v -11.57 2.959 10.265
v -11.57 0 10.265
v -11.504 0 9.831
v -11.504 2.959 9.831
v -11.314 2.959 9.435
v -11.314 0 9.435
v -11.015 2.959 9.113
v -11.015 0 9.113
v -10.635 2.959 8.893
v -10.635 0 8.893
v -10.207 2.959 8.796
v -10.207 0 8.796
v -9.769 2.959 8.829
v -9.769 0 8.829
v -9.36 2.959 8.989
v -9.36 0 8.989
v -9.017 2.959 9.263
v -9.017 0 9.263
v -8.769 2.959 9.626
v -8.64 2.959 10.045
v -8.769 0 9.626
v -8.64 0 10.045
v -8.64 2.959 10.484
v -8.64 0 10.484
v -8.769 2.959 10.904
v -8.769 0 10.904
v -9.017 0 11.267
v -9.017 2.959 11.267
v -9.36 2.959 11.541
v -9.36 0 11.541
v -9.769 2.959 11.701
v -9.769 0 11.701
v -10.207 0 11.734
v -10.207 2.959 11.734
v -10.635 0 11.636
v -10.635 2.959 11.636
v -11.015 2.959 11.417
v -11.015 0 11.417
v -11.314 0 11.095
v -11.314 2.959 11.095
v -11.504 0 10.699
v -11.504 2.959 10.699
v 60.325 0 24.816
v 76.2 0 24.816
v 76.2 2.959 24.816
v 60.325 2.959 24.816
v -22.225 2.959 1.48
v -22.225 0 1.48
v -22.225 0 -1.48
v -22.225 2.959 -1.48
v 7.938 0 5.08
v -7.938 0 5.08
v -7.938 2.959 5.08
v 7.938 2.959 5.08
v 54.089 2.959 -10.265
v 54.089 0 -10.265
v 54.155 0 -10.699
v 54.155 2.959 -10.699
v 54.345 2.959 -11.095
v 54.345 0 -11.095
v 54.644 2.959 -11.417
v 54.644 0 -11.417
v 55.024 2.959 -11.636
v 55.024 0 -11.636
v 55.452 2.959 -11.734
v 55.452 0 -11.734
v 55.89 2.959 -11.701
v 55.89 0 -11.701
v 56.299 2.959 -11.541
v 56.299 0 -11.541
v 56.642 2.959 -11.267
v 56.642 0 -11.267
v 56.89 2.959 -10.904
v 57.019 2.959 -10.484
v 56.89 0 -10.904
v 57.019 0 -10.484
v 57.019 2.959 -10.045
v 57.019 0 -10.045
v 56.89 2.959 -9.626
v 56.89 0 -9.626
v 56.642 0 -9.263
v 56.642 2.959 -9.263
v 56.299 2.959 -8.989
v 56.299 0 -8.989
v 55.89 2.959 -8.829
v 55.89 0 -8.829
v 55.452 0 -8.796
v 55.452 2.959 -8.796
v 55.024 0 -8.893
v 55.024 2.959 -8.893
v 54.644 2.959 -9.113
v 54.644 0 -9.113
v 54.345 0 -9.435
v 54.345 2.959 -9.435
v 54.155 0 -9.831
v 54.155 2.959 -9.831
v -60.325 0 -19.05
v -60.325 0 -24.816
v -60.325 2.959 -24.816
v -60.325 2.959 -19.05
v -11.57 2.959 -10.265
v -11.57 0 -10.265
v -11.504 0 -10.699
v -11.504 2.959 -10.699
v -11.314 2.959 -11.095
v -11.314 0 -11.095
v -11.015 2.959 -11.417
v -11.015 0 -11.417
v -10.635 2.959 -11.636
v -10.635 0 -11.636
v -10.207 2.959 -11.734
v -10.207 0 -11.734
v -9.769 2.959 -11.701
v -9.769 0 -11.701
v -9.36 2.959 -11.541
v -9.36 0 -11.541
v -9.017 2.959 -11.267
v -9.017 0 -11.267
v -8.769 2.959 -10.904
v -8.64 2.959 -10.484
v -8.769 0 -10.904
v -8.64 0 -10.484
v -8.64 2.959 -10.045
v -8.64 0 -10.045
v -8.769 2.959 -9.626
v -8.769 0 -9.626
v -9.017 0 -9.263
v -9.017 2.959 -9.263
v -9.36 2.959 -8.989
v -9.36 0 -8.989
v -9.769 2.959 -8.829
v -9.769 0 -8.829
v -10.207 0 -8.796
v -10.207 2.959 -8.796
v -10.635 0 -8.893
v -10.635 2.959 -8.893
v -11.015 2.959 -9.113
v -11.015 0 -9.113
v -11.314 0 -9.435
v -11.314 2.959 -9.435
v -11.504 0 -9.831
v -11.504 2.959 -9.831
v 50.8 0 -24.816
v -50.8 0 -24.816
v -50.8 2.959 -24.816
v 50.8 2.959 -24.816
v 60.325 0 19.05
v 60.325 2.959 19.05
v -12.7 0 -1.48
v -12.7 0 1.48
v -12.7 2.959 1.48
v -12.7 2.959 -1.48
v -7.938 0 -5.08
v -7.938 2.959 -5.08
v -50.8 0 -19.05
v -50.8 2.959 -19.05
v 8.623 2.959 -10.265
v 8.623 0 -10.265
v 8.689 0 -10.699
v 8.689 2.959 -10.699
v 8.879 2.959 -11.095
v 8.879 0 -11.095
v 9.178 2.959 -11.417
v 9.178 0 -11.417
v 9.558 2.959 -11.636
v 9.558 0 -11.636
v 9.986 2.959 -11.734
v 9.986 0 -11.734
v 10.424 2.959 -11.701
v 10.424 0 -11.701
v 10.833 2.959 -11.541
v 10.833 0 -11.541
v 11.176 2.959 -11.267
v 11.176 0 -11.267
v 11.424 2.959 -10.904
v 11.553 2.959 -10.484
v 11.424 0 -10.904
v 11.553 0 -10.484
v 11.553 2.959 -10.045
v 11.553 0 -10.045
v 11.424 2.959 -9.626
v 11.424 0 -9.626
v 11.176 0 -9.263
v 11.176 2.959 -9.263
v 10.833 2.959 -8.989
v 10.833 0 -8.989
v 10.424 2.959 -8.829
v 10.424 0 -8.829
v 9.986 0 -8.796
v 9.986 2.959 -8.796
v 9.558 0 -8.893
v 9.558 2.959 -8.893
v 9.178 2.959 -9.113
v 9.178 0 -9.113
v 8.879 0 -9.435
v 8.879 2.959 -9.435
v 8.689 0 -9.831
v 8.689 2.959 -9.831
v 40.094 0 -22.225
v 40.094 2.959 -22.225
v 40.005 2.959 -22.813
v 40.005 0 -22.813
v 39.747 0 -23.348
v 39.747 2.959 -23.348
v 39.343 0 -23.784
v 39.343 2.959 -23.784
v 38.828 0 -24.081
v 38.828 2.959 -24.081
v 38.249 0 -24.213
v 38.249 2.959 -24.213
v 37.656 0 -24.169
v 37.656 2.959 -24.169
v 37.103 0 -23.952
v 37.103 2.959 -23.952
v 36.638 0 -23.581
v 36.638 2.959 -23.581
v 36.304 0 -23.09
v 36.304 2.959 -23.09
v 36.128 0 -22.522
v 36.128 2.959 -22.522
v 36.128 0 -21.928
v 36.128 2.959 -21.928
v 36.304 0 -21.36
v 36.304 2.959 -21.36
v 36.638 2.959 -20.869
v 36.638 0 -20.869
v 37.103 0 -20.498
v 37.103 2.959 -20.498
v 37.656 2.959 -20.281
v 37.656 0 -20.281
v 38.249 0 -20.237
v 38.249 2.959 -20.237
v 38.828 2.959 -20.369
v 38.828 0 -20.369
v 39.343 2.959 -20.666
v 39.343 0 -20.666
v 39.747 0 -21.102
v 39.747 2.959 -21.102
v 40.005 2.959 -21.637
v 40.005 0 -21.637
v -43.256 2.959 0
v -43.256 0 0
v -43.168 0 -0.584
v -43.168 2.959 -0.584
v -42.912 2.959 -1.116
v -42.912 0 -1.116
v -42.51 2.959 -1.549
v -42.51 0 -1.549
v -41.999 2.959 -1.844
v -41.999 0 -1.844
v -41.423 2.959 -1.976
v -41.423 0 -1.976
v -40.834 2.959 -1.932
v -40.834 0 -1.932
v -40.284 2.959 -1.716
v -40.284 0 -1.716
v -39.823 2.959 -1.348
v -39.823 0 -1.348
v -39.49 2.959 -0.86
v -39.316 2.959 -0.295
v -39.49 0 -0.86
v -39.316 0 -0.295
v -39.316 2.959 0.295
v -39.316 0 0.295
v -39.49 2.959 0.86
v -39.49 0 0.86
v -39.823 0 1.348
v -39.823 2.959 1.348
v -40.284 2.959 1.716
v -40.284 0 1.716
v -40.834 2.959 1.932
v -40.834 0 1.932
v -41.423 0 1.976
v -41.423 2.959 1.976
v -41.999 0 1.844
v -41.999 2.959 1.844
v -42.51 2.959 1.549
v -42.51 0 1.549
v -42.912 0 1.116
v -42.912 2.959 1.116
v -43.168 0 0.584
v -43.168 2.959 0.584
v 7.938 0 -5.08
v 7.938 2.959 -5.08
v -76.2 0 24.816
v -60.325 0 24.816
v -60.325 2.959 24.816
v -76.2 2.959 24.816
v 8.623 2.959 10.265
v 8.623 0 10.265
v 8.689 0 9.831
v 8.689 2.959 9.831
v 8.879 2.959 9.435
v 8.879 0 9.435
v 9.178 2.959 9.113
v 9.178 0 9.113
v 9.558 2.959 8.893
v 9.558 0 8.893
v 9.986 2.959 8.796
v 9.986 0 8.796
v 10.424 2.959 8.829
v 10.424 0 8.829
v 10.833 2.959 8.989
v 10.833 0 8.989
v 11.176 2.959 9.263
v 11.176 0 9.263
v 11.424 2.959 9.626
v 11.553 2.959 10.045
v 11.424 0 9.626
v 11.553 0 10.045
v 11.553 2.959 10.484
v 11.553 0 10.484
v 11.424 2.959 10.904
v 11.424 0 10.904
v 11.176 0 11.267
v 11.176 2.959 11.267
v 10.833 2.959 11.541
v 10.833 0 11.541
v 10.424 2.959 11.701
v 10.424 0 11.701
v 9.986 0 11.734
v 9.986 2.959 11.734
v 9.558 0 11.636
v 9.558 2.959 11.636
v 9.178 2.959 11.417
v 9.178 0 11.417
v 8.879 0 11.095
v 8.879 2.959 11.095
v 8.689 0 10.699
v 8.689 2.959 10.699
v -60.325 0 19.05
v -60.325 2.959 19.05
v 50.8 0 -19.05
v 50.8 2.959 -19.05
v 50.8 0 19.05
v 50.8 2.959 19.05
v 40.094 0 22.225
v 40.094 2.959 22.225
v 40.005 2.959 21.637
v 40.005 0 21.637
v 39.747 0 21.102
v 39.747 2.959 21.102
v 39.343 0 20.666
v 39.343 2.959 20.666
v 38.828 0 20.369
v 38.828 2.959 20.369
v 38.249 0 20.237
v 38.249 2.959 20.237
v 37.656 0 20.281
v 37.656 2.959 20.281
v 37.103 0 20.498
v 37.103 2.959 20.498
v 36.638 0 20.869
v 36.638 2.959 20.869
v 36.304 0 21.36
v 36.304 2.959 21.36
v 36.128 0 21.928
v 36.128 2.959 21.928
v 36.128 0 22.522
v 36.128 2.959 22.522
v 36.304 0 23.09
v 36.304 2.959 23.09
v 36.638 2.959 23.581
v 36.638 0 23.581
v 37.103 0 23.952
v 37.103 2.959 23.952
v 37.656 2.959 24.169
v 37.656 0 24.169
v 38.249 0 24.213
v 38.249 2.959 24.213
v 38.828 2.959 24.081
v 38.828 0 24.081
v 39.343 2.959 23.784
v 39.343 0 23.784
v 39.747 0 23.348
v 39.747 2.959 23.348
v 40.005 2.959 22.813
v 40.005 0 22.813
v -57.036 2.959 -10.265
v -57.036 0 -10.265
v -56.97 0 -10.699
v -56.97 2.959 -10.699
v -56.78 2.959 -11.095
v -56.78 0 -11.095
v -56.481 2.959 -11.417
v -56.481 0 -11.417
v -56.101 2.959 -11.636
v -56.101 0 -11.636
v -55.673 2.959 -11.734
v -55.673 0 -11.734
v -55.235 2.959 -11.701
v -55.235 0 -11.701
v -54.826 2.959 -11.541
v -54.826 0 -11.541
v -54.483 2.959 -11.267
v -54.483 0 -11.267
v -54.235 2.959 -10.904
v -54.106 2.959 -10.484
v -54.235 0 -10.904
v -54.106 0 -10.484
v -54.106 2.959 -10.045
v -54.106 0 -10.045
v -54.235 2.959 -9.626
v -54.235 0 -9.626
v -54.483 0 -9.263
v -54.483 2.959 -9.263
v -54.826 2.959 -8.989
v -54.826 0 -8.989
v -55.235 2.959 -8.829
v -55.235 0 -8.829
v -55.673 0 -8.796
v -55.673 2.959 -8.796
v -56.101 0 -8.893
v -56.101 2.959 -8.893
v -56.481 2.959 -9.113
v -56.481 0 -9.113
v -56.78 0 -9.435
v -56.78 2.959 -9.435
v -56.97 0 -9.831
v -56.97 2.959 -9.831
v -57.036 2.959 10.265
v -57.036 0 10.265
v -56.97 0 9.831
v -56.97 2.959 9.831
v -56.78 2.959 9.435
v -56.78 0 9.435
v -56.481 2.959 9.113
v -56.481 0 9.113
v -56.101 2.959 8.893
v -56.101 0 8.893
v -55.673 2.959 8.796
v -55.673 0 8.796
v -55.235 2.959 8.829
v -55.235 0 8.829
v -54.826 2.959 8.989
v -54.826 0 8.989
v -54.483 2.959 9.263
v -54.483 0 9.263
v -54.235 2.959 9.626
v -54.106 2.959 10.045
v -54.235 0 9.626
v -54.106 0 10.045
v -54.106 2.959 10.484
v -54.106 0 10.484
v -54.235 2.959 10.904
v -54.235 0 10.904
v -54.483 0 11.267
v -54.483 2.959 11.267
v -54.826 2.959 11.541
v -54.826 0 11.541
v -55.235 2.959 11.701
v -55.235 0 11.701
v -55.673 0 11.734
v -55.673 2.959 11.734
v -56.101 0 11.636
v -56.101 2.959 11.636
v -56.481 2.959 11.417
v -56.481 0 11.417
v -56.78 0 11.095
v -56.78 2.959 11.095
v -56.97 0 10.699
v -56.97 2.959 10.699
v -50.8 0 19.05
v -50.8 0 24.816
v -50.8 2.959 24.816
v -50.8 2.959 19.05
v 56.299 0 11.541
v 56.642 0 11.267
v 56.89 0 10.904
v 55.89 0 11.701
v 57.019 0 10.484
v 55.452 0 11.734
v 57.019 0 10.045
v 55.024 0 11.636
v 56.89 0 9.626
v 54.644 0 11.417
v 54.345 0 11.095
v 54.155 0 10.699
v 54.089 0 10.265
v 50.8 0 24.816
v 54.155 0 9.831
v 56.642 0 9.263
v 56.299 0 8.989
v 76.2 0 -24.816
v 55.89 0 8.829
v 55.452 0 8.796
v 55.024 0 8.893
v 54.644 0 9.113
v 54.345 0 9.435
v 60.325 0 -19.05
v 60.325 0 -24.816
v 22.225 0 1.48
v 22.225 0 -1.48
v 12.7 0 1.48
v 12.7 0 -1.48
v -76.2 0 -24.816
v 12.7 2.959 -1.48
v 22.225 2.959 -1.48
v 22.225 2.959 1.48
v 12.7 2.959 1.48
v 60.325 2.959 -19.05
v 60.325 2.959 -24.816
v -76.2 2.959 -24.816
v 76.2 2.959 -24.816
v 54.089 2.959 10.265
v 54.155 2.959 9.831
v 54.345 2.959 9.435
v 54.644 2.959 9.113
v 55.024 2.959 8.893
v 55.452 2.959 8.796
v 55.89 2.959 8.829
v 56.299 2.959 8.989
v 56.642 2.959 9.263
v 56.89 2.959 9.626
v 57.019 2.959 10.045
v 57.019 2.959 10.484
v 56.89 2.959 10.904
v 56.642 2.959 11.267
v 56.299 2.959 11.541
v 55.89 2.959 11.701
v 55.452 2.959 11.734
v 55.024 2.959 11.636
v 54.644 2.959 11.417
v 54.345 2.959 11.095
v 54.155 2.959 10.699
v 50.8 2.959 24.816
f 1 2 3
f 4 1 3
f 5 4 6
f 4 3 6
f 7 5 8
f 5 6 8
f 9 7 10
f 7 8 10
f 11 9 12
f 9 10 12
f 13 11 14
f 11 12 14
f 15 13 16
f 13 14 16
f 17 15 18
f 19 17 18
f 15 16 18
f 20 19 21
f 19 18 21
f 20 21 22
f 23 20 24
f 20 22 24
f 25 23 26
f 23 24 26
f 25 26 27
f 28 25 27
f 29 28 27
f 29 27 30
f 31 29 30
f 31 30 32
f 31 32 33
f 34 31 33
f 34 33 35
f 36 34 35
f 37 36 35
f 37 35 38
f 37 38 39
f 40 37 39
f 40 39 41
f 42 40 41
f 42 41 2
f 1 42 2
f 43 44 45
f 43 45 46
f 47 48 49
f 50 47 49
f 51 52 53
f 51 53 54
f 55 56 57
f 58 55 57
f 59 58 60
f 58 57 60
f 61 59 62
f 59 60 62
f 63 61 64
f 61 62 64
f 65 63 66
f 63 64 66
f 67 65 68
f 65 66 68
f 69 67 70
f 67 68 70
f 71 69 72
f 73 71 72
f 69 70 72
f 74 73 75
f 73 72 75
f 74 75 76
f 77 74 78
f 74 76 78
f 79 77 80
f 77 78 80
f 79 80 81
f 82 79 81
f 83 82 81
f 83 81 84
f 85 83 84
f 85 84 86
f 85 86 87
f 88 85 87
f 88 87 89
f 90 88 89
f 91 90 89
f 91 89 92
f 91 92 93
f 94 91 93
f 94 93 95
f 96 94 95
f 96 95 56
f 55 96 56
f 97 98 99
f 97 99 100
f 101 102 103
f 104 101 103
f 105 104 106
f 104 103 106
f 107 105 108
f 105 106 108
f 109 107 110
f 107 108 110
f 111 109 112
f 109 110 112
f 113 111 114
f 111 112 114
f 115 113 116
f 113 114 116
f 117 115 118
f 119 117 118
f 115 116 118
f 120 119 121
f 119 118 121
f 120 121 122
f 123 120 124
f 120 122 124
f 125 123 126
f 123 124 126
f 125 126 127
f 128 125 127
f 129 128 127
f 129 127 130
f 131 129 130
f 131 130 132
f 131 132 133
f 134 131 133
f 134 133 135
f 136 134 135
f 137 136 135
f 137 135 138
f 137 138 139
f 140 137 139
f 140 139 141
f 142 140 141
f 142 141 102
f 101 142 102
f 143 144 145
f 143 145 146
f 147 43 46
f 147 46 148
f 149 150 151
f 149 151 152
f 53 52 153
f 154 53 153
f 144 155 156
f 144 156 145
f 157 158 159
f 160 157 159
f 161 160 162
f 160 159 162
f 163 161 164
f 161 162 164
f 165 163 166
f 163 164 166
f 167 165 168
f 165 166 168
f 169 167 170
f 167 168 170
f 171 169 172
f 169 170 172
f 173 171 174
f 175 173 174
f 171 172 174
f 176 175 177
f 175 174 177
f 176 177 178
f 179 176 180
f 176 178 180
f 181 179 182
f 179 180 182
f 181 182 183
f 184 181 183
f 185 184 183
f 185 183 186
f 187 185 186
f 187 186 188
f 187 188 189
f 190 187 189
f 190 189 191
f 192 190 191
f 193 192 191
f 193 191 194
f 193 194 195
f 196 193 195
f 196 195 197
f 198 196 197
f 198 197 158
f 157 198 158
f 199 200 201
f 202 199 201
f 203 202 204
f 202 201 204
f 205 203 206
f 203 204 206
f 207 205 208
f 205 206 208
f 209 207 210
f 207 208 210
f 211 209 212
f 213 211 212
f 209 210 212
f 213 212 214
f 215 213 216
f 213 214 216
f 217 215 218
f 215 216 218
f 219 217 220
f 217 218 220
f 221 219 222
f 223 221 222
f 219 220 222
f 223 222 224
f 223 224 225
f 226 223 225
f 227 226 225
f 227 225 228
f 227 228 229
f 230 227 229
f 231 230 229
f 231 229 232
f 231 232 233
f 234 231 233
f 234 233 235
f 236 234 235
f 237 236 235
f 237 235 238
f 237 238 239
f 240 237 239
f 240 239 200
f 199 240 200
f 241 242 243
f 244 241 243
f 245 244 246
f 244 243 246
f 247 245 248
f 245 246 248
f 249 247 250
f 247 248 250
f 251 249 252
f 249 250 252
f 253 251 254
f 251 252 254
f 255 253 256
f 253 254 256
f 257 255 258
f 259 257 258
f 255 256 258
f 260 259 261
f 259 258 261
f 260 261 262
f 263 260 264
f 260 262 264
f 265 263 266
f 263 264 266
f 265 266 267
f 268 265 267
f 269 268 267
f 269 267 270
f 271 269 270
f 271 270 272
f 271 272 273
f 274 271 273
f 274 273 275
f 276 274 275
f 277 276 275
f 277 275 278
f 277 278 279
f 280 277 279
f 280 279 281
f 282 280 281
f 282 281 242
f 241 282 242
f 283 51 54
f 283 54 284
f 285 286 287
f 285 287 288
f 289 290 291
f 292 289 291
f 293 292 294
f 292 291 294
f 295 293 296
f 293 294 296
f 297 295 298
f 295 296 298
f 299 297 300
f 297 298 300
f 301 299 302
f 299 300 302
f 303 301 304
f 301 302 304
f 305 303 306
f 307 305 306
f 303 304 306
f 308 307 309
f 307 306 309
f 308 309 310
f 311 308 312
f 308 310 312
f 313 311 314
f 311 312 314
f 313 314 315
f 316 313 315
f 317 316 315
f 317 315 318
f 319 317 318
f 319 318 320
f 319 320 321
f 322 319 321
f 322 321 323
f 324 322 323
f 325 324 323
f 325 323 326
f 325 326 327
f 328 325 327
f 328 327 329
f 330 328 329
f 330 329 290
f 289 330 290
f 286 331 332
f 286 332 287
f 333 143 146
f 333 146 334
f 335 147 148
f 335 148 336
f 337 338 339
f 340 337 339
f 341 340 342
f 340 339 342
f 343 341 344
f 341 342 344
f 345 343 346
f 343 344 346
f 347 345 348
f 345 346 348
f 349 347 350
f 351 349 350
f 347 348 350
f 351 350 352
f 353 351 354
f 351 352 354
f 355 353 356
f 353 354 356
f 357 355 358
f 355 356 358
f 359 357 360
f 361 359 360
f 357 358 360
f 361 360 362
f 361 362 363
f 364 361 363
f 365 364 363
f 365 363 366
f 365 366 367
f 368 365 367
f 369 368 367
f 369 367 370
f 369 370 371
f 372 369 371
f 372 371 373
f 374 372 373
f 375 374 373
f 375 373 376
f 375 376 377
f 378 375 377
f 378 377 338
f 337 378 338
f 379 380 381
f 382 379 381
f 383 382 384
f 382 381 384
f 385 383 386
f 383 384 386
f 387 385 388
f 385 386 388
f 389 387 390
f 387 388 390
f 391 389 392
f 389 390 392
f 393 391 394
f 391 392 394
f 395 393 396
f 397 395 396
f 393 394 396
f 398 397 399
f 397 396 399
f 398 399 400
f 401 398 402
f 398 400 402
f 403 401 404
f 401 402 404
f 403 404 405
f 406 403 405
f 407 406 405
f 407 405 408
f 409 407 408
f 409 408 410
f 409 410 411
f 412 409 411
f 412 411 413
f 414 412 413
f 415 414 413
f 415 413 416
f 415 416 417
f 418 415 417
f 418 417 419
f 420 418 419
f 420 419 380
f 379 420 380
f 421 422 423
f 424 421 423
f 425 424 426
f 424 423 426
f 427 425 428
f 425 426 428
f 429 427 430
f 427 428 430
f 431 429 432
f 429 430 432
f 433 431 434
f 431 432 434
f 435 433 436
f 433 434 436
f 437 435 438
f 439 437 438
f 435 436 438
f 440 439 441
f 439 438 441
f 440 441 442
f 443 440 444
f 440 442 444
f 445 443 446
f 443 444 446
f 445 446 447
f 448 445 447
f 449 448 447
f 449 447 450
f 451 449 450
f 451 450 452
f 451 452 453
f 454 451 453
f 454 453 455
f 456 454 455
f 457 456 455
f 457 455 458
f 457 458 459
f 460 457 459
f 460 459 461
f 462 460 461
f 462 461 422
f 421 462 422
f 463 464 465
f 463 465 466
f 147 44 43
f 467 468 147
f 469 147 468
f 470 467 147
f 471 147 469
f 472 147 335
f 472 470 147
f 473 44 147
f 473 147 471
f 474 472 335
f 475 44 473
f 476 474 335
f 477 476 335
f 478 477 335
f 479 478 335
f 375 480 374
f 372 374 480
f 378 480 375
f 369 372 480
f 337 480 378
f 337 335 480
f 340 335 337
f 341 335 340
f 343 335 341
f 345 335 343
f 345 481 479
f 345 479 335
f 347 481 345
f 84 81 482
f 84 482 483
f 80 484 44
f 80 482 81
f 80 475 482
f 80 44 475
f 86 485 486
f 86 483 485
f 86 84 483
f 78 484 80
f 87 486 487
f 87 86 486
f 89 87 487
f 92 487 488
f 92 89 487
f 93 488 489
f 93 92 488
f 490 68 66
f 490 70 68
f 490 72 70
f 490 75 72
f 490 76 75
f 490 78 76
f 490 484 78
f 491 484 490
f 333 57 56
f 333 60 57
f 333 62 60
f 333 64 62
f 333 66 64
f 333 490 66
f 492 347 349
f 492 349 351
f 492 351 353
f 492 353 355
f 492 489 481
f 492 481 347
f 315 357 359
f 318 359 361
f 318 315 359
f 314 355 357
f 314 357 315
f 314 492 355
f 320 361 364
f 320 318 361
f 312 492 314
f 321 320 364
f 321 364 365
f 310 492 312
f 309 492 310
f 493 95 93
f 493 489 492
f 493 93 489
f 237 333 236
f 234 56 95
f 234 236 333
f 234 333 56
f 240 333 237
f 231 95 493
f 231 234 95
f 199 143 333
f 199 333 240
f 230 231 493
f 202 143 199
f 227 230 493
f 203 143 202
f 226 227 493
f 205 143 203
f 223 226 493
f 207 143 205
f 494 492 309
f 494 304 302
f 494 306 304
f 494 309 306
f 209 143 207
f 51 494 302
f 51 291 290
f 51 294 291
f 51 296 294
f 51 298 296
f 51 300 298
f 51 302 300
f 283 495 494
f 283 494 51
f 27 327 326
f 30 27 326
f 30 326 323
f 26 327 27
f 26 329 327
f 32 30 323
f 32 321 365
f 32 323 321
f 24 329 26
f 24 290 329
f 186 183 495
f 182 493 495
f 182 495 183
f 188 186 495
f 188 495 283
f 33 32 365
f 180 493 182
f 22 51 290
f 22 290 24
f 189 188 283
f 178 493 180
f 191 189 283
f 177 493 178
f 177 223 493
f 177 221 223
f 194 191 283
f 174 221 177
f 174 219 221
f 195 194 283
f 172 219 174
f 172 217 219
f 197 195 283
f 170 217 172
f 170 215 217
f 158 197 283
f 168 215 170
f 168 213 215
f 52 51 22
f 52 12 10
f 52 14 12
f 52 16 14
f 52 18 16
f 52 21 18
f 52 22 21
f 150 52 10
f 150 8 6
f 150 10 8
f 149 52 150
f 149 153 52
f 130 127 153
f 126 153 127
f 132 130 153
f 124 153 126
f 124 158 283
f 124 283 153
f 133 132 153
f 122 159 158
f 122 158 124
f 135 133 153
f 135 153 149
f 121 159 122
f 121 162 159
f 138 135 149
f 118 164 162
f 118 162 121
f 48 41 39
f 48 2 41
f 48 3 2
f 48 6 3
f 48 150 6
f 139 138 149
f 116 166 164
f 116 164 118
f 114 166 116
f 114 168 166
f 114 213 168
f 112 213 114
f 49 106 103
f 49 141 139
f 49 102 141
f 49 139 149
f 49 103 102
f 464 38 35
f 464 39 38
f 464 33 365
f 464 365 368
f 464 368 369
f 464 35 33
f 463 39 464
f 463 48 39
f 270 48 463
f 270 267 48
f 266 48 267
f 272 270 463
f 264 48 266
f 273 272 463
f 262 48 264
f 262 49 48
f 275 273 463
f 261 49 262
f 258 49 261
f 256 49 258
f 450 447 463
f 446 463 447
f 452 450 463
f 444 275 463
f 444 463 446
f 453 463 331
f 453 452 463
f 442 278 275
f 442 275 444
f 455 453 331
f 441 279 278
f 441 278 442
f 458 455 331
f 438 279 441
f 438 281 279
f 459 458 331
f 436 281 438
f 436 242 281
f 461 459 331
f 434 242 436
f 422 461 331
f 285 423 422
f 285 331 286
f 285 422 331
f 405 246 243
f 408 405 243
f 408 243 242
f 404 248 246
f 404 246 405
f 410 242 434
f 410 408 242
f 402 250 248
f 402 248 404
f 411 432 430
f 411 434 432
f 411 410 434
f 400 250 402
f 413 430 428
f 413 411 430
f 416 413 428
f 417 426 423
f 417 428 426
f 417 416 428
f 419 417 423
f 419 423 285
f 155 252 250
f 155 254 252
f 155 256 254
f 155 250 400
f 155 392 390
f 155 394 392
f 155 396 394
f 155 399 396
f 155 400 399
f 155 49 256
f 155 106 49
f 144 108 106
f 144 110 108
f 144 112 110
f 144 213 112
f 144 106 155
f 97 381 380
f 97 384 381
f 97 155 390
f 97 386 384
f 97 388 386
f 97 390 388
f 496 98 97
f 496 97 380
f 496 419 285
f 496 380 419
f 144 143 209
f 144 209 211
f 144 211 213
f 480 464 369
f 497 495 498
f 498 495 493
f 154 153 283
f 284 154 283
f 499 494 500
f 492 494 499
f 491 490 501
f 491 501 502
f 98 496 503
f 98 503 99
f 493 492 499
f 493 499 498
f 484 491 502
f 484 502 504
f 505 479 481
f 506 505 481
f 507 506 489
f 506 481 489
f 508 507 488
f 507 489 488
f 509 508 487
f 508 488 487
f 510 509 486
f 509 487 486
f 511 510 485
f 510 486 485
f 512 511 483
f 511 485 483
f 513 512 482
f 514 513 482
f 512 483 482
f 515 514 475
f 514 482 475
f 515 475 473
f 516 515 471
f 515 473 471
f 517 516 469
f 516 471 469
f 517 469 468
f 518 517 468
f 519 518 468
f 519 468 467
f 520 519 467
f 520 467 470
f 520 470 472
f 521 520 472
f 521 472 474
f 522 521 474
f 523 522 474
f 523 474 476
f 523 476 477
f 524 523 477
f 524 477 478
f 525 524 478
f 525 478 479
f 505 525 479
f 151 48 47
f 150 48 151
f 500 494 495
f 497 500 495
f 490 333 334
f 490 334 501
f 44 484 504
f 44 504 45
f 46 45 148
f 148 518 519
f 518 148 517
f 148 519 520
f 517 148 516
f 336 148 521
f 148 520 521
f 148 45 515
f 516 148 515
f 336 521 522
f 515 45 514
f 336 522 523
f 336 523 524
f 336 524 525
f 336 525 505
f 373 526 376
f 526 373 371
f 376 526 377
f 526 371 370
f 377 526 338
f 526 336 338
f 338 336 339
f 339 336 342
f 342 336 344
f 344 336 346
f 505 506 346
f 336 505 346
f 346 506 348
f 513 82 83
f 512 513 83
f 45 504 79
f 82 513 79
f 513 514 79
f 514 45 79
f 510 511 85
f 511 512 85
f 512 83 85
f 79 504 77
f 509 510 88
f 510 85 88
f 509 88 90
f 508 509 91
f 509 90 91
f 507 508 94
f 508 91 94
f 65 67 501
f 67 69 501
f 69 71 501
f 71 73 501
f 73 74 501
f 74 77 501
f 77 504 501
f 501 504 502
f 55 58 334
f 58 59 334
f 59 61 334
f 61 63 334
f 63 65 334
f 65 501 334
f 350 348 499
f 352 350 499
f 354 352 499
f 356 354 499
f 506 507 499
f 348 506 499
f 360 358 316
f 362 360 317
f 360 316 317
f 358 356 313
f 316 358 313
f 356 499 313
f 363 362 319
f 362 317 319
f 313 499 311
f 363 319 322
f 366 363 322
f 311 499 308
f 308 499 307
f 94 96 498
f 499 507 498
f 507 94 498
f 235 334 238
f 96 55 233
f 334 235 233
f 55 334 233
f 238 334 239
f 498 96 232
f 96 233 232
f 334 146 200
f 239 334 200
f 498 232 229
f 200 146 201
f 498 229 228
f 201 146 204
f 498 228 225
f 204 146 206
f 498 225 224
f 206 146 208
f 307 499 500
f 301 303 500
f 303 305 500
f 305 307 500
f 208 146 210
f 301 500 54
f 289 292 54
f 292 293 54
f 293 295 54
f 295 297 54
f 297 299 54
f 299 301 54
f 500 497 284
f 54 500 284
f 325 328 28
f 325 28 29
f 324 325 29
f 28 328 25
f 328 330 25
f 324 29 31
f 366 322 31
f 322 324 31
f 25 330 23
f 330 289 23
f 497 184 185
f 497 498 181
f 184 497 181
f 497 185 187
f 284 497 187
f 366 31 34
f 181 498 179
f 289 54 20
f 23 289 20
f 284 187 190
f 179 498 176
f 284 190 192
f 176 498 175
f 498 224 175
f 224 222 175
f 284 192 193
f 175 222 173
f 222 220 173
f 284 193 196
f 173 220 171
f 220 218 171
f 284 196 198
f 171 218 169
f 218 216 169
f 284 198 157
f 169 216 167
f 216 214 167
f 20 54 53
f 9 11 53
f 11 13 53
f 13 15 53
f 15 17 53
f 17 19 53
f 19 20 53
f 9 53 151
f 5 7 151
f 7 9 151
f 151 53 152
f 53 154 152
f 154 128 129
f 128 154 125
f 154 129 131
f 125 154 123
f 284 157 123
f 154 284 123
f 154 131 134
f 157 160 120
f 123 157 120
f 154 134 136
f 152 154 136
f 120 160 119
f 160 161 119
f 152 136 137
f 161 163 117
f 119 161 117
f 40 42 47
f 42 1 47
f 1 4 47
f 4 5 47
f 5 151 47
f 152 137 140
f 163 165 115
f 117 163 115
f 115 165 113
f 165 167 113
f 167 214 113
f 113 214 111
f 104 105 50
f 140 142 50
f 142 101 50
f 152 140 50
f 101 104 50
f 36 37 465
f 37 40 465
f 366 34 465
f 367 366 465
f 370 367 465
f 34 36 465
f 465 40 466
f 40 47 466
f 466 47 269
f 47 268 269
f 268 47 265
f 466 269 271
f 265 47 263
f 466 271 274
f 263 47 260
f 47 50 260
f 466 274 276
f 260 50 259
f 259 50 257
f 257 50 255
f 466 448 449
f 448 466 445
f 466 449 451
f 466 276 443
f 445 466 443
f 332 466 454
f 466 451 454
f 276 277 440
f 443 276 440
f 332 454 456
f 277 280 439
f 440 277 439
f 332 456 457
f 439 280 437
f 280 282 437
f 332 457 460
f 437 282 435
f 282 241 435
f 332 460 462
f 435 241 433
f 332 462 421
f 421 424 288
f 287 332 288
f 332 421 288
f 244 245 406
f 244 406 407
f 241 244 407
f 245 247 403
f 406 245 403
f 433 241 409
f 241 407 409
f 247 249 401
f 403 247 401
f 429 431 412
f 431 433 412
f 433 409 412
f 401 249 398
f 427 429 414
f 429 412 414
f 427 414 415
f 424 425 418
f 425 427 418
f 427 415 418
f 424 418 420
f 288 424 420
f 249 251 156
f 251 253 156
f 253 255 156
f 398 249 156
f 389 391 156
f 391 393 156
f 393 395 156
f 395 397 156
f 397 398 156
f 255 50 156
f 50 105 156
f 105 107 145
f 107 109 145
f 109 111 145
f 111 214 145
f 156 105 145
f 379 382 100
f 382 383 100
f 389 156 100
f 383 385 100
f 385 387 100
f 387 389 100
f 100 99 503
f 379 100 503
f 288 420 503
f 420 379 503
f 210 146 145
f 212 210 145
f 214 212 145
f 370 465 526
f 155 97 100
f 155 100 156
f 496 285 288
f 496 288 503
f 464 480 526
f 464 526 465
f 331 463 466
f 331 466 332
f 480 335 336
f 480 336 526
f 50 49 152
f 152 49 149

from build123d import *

# Parameters (mm, degrees)
SKETCH2_W                       = 9.525
SKETCH2_H                       = 2.9591
SKETCH2_W_2                     = 15.875
SKETCH2_H_2                     = 10.16
BOSS_EXTRUDE1_DEPTH             = 2.9591
F_4_CLEARANCE_HOLE1_D           = 2.9464
F_4_CLEARANCE_HOLE1_DEPTH       = 3.302
F_4_CLEARANCE_HOLE1_TIP         = 0.885187864
F_4_CLEARANCE_HOLE2_D           = 3.9624
F_4_CLEARANCE_HOLE2_DEPTH       = 3.302
F_4_CLEARANCE_HOLE2_TIP         = 1.190425058
TAP_DRILL_FOR_4_HELICOIL1_D     = 3.9878
TAP_DRILL_FOR_4_HELICOIL1_DEPTH = 5.588
TAP_DRILL_FOR_4_HELICOIL1_TIP   = 1.198055988


with BuildPart() as part:
    # Sketch2 → Boss-Extrude1 (new body)
    with BuildSketch(Plane(origin=(0, 0, 0), x_dir=(1, 0, 0), z_dir=(0, 1, 0))):
        Polygon((-76.2, 24.8158), (-60.325, 24.8158), (-60.325, 19.05), (-50.8, 19.05), (-50.8, 24.8158), (50.8, 24.8158), (50.8, 19.05), (60.325, 19.05), (60.325, 24.8158), (76.2, 24.8158), (76.2, -24.8158), (60.325, -24.8158), (60.325, -19.05), (50.8, -19.05), (50.8, -24.8158), (-50.8, -24.8158), (-50.8, -19.05), (-60.325, -19.05), (-60.325, -24.8158), (-76.2, -24.8158), align=None)
        with Locations((-17.4625, 0)):
            Rectangle(SKETCH2_W, SKETCH2_H, mode=Mode.SUBTRACT)
        with Locations((17.4625, 0)):
            Rectangle(SKETCH2_W, SKETCH2_H, mode=Mode.SUBTRACT)
        Rectangle(SKETCH2_W_2, SKETCH2_H_2, mode=Mode.SUBTRACT)
    extrude(amount=BOSS_EXTRUDE1_DEPTH)

    # #4 Clearance Hole1
    with Locations(Plane(origin=(0, 2.9591, 0), x_dir=(1, 0, 0), z_dir=(0, 1, 0))):
        with Locations((0, 0), (10.0965, 10.264775), (-10.0965, -10.264775), (-10.0965, 10.264775), (10.0965, -10.264775), (55.5625, 10.264775), (-55.5625, -10.264775), (55.5625, -10.264775), (-55.5625, 10.264775)):
            Hole(F_4_CLEARANCE_HOLE1_D / 2, depth=F_4_CLEARANCE_HOLE1_DEPTH)
            with Locations((0, 0, -(F_4_CLEARANCE_HOLE1_DEPTH + F_4_CLEARANCE_HOLE1_TIP / 2))):  # 118° drill point
                Cone(0, F_4_CLEARANCE_HOLE1_D / 2, F_4_CLEARANCE_HOLE1_TIP, mode=Mode.SUBTRACT)

    # #4 Clearance Hole2
    with Locations(Plane(origin=(0, 2.9591, 0), x_dir=(1, 0, 0), z_dir=(0, 1, 0))):
        with Locations((-41.275, 0)):
            Hole(F_4_CLEARANCE_HOLE2_D / 2, depth=F_4_CLEARANCE_HOLE2_DEPTH)
            with Locations((0, 0, -(F_4_CLEARANCE_HOLE2_DEPTH + F_4_CLEARANCE_HOLE2_TIP / 2))):  # 118° drill point
                Cone(0, F_4_CLEARANCE_HOLE2_D / 2, F_4_CLEARANCE_HOLE2_TIP, mode=Mode.SUBTRACT)

    # Tap Drill for #4 Helicoil1
    with Locations(Plane(origin=(0, 0, 0), x_dir=(-1, 0, 0), z_dir=(0, -1, 0))):
        with Locations((-38.1, 22.225), (-38.1, -22.225)):
            Hole(TAP_DRILL_FOR_4_HELICOIL1_D / 2, depth=TAP_DRILL_FOR_4_HELICOIL1_DEPTH)
            with Locations((0, 0, -(TAP_DRILL_FOR_4_HELICOIL1_DEPTH + TAP_DRILL_FOR_4_HELICOIL1_TIP / 2))):  # 118° drill point
                Cone(0, TAP_DRILL_FOR_4_HELICOIL1_D / 2, TAP_DRILL_FOR_4_HELICOIL1_TIP, mode=Mode.SUBTRACT)


solid = part.part
